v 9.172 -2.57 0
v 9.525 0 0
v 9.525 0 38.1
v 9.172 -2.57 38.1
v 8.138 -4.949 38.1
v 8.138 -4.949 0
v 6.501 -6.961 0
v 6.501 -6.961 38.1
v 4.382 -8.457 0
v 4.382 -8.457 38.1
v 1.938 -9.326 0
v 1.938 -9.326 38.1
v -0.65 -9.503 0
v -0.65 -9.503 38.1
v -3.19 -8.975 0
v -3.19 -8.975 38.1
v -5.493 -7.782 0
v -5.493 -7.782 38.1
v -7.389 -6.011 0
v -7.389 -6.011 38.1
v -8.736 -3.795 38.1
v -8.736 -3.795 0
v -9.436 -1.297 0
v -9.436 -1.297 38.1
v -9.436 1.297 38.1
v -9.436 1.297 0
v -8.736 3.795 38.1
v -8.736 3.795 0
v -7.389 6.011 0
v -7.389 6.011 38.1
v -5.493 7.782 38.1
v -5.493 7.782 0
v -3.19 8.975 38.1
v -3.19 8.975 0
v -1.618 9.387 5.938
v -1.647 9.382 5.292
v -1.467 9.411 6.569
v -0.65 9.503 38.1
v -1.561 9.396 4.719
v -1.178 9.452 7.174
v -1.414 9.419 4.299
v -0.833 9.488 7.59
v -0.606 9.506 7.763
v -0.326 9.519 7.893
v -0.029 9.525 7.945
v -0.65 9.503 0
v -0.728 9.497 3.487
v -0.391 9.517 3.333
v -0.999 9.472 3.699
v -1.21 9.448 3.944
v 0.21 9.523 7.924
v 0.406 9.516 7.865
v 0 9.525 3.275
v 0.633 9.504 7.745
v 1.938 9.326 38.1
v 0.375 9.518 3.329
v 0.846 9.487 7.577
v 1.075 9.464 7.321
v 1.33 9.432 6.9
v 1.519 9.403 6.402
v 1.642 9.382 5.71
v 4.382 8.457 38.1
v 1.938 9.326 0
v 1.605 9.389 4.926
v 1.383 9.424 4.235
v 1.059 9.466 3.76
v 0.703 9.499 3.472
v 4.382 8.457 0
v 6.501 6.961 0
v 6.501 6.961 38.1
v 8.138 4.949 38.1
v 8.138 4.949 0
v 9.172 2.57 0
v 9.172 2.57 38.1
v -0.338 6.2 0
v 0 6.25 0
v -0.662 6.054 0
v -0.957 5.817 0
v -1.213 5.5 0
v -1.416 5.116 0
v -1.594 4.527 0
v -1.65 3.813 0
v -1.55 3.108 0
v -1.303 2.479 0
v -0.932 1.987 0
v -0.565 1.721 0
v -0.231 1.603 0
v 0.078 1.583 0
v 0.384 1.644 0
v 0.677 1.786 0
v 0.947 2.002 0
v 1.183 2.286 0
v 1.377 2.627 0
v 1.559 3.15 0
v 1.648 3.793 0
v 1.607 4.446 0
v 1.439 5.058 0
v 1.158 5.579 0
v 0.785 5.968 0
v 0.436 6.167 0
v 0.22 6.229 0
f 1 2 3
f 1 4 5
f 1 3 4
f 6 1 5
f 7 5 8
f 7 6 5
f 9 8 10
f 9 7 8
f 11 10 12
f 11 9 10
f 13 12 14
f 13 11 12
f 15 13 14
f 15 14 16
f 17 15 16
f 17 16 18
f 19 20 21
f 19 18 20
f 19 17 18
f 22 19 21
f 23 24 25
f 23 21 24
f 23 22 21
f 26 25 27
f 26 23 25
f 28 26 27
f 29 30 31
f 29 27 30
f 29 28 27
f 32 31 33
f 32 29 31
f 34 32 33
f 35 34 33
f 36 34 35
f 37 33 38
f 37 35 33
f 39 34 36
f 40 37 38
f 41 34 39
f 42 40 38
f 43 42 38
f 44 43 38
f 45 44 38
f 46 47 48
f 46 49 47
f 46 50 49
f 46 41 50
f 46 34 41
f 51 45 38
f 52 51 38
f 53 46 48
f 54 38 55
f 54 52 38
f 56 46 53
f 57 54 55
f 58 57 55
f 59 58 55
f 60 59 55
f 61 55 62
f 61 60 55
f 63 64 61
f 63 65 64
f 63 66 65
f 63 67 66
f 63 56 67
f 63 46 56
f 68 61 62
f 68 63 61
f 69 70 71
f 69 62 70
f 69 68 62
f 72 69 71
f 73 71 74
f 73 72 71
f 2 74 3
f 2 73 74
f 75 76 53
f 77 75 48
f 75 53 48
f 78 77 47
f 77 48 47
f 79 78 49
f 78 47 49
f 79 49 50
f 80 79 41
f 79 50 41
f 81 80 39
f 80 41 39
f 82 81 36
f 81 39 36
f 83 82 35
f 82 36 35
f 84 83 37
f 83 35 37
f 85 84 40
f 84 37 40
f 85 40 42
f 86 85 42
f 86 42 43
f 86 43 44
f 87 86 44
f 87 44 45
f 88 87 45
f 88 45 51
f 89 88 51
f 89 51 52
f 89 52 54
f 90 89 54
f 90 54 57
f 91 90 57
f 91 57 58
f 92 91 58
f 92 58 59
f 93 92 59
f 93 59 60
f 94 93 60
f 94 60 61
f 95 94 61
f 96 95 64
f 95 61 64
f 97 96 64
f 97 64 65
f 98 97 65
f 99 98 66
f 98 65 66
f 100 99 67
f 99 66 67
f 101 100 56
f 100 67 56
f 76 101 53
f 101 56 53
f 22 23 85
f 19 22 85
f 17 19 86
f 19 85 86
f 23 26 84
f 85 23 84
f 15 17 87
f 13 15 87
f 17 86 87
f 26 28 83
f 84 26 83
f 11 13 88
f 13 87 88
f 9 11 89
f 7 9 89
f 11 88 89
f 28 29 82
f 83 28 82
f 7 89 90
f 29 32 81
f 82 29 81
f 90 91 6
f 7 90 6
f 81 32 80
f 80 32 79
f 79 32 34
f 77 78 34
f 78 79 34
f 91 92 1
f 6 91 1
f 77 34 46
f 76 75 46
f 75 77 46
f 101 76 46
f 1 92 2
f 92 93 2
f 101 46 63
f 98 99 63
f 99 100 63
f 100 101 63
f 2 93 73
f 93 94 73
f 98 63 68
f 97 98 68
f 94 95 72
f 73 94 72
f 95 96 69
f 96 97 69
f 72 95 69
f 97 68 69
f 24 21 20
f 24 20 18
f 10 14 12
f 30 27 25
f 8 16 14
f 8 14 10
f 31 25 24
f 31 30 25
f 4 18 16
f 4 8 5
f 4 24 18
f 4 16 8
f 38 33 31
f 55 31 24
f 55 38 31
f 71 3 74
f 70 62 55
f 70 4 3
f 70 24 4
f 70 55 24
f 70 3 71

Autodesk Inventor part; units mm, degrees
ref_plane "YZ Plane" through (0, 0, 0) normal (1, 0, 0) x (0, 1, 0)
ref_plane "XY Plane" through (0, 0, 0) normal (0, 0, 1) x (1, 0, 0)
sketch "Sketch1" plane through (0, 0, 0) normal (0, 0, 1) x (1, 0, 0)
  circle A0 centre (0, 0) radius 9.525
  dimension "d0" = 19.05
extrude "Extrusion1" add sketch "Sketch1" along normal blind 38.1
ref_plane "Work Plane2" through (0, 15.875, 0) normal (0, 1, 0) x (-1, 0, 0)
sketch "Sketch4" plane through (0, 15.875, 0) normal (0, 1, 0) x (-1, 0, 0)
  circle A0 centre (0, 7.62) radius 1.4605
  point P0 (0, 0)
  dimension "d6" = 2.921
  dimension "d7" = 7.62
sketch "Sketch5" plane through (0, 0, 0) normal (0, 0, -1) x (-1, 0, 0)
  circle A0 centre (0, 0) radius 9.525 projected
  circle A1 centre (0, 1.905) radius 1.4605
  line L0 (0, 9.525) -> (14.2875, 9.525)
  dimension "d8" = 2.921
  dimension "d9" = 7.62
ref_plane "Work Plane3" through (0, 9.525, 0) normal (0, 0.7071, 0.7071) x (-1, 0, 0)
sketch "Sketch6" plane through (0, 9.525, 0) normal (0, 0.7071, 0.7071) x (-1, 0, 0)
  circle A0 centre (0, 3.9683) radius 1.5875
  point P0 (0, 6.7352)
  dimension "d11" = 3.175
extrude "Extrusion2" add sketch "Sketch6" along normal mid plane 25.4
sketch "Sketch7" plane through (0, -2.2613, -6.1742) normal (0, -0.7071, -0.7071) x (-1, 0, 0)
  circle A0 centre (0, 0) radius 1.5875 projected
  circle A1 centre (0, 0) radius 1.5875 projected
  point P0 (0, -2.7669)
hole "Hole1" at (-0.0004, -2.2603, -6.1752) direction (0, 0.7071, 0.7071) diameter 3.302 depth 25.4 tip angle 118
properties part number "Brass"
